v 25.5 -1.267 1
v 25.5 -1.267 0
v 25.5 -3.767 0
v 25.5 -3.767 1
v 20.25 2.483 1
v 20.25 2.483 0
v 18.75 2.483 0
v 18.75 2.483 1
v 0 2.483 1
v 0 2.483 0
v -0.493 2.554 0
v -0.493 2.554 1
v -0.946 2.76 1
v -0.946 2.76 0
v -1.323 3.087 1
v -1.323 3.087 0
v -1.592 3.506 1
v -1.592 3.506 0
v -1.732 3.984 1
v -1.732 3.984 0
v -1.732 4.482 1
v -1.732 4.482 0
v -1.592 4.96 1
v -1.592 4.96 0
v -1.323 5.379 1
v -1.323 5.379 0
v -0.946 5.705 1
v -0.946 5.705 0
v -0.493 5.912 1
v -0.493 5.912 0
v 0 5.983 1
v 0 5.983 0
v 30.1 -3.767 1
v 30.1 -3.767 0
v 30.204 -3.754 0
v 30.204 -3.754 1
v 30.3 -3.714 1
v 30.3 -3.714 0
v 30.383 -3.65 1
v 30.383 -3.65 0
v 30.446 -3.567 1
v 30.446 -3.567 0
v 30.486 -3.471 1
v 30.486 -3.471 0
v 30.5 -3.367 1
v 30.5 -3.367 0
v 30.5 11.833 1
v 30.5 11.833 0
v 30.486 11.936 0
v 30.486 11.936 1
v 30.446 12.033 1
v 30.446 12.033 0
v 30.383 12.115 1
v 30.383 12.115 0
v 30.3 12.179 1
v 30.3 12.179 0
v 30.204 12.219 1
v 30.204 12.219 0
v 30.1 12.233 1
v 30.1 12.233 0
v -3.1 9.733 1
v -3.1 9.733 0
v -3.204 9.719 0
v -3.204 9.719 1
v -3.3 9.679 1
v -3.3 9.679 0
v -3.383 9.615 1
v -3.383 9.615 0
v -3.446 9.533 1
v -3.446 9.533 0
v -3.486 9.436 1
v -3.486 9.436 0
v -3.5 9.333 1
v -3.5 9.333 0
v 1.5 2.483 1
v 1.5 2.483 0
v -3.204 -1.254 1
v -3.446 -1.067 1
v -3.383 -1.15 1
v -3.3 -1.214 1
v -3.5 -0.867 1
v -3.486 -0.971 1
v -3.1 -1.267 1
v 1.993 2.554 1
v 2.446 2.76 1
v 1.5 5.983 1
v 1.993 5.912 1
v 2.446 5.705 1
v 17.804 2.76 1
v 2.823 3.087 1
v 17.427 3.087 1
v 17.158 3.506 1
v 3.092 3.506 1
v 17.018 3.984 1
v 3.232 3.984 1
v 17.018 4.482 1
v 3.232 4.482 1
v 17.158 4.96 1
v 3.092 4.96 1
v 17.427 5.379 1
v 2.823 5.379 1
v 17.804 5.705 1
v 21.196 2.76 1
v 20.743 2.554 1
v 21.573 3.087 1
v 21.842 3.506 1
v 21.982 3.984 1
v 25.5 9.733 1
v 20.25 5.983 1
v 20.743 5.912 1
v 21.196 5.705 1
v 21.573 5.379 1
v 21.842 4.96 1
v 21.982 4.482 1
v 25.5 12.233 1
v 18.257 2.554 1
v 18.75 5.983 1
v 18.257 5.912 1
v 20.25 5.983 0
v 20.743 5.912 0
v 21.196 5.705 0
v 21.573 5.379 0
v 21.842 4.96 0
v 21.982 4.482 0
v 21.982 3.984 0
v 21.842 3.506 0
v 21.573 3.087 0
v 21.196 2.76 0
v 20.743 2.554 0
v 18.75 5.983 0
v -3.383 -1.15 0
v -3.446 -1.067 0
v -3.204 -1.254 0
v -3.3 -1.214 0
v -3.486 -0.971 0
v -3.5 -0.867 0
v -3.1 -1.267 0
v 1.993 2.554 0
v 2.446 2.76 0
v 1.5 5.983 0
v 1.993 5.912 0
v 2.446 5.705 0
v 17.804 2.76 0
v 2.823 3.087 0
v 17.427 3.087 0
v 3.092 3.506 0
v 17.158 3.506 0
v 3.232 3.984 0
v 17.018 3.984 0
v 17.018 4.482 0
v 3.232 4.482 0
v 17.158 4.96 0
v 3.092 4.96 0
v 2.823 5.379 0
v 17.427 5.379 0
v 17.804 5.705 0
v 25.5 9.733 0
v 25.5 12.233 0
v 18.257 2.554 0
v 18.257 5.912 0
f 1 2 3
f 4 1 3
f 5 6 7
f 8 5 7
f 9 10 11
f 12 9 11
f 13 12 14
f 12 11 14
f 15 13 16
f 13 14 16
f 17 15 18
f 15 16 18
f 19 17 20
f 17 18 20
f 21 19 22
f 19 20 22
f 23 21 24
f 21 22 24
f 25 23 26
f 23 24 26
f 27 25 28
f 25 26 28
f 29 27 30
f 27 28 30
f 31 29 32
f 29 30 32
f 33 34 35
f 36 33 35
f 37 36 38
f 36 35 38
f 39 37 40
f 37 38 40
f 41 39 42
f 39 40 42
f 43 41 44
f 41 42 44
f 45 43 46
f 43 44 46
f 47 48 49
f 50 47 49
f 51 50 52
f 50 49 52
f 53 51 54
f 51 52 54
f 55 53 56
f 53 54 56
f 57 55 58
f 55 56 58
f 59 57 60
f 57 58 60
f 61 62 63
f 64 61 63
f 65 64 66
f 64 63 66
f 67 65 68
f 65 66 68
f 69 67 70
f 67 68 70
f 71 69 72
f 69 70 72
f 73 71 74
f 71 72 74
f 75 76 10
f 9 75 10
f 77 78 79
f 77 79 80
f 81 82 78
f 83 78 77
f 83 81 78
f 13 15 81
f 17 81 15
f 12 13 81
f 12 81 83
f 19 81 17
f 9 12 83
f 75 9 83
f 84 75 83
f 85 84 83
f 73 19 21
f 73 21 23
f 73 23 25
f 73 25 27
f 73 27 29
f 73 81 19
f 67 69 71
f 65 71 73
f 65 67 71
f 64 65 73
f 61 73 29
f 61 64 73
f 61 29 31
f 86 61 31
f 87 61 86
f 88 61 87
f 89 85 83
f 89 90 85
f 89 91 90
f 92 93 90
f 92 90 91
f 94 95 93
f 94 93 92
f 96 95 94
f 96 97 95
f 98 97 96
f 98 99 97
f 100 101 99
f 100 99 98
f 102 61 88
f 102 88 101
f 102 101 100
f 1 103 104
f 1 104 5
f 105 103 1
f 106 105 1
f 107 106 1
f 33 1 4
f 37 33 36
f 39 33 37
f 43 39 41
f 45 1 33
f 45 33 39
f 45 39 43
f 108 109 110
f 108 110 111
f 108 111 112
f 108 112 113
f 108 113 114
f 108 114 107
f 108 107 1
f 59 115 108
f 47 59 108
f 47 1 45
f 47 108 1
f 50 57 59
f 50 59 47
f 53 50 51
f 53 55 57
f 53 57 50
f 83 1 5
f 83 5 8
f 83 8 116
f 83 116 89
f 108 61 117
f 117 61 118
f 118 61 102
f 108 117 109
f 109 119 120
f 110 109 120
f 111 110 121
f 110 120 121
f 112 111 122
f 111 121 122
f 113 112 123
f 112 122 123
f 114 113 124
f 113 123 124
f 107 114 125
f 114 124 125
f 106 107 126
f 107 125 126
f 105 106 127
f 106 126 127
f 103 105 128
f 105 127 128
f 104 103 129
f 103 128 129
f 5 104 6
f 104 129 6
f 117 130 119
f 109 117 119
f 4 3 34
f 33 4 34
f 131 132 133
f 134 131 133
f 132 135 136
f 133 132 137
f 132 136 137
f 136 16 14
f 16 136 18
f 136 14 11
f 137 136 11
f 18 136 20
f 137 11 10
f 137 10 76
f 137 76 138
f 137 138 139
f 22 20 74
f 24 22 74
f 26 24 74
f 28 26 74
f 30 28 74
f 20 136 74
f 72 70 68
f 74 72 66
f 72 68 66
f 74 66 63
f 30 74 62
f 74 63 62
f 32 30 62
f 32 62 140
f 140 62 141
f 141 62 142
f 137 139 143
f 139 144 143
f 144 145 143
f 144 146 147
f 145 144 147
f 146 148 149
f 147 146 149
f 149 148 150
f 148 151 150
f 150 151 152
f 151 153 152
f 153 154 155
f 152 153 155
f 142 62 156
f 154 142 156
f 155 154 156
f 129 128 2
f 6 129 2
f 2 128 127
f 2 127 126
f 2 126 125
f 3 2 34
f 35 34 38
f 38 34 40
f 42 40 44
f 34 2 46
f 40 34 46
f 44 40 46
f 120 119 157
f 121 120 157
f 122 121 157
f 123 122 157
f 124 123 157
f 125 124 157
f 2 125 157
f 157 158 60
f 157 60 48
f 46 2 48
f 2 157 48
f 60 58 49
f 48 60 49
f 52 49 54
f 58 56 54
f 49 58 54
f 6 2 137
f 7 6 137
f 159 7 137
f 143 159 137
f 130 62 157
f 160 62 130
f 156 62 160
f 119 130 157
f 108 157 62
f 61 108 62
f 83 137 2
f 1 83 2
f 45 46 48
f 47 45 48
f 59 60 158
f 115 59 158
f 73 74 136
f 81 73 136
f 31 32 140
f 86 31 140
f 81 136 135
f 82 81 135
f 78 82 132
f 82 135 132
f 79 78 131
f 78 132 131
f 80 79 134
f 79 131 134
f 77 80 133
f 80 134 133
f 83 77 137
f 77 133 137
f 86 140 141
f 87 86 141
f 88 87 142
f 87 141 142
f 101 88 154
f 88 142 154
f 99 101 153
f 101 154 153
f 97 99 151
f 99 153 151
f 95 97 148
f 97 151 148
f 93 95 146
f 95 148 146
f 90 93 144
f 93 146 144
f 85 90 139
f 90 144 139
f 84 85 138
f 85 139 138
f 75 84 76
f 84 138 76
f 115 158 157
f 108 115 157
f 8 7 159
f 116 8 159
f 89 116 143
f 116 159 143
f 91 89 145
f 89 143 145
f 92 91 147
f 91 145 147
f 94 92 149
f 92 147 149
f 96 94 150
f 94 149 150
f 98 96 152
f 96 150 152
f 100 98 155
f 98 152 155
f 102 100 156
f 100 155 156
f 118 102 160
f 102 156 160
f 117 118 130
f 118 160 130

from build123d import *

# Parameters (mm, degrees)
DODANIE_WYCI_GNI_CIE1_DEPTH = 1


with BuildPart() as part:
    # Szkic1 → Dodanie-wyciągnięcie1 (new body)
    with BuildSketch(Plane.XY):
        with BuildLine():
            Line((-3.1, -1.267343807), (25.5, -1.267343807))
            Line((25.5, -1.267343807), (25.5, -3.767343807))
            Line((25.5, -3.767343807), (30.1, -3.767343807))
            ThreePointArc((30.1, -3.767343807), (30.382842712, -3.650186519), (30.5, -3.367343807))
            Line((30.5, -3.367343807), (30.5, 11.832656193))
            ThreePointArc((30.5, 11.832656193), (30.382842712, 12.115498905), (30.1, 12.232656193))
            Line((30.1, 12.232656193), (25.5, 12.232656193))
            Line((25.5, 12.232656193), (25.5, 9.732656193))
            Line((25.5, 9.732656193), (-3.1, 9.732656193))
            ThreePointArc((-3.1, 9.732656193), (-3.382842712, 9.615498905), (-3.5, 9.332656193))
            Line((-3.5, 9.332656193), (-3.5, -0.867343807))
            ThreePointArc((-3.5, -0.867343807), (-3.382842712, -1.150186519), (-3.1, -1.267343807))
        make_face()
        with BuildLine():
            Line((18.75, 5.982656193), (20.25, 5.982656193))
            ThreePointArc((20.25, 5.982656193), (22, 4.232656193), (20.25, 2.482656193))
            Line((20.25, 2.482656193), (18.75, 2.482656193))
            ThreePointArc((18.75, 2.482656193), (17, 4.232656193), (18.75, 5.982656193))
        make_face(mode=Mode.SUBTRACT)
        with BuildLine():
            Line((0, 5.982656193), (1.5, 5.982656193))
            ThreePointArc((1.5, 5.982656193), (3.25, 4.232656193), (1.5, 2.482656193))
            Line((1.5, 2.482656193), (0, 2.482656193))
            ThreePointArc((0, 2.482656193), (-1.75, 4.232656193), (0, 5.982656193))
        make_face(mode=Mode.SUBTRACT)
    extrude(amount=DODANIE_WYCI_GNI_CIE1_DEPTH)


solid = part.part
